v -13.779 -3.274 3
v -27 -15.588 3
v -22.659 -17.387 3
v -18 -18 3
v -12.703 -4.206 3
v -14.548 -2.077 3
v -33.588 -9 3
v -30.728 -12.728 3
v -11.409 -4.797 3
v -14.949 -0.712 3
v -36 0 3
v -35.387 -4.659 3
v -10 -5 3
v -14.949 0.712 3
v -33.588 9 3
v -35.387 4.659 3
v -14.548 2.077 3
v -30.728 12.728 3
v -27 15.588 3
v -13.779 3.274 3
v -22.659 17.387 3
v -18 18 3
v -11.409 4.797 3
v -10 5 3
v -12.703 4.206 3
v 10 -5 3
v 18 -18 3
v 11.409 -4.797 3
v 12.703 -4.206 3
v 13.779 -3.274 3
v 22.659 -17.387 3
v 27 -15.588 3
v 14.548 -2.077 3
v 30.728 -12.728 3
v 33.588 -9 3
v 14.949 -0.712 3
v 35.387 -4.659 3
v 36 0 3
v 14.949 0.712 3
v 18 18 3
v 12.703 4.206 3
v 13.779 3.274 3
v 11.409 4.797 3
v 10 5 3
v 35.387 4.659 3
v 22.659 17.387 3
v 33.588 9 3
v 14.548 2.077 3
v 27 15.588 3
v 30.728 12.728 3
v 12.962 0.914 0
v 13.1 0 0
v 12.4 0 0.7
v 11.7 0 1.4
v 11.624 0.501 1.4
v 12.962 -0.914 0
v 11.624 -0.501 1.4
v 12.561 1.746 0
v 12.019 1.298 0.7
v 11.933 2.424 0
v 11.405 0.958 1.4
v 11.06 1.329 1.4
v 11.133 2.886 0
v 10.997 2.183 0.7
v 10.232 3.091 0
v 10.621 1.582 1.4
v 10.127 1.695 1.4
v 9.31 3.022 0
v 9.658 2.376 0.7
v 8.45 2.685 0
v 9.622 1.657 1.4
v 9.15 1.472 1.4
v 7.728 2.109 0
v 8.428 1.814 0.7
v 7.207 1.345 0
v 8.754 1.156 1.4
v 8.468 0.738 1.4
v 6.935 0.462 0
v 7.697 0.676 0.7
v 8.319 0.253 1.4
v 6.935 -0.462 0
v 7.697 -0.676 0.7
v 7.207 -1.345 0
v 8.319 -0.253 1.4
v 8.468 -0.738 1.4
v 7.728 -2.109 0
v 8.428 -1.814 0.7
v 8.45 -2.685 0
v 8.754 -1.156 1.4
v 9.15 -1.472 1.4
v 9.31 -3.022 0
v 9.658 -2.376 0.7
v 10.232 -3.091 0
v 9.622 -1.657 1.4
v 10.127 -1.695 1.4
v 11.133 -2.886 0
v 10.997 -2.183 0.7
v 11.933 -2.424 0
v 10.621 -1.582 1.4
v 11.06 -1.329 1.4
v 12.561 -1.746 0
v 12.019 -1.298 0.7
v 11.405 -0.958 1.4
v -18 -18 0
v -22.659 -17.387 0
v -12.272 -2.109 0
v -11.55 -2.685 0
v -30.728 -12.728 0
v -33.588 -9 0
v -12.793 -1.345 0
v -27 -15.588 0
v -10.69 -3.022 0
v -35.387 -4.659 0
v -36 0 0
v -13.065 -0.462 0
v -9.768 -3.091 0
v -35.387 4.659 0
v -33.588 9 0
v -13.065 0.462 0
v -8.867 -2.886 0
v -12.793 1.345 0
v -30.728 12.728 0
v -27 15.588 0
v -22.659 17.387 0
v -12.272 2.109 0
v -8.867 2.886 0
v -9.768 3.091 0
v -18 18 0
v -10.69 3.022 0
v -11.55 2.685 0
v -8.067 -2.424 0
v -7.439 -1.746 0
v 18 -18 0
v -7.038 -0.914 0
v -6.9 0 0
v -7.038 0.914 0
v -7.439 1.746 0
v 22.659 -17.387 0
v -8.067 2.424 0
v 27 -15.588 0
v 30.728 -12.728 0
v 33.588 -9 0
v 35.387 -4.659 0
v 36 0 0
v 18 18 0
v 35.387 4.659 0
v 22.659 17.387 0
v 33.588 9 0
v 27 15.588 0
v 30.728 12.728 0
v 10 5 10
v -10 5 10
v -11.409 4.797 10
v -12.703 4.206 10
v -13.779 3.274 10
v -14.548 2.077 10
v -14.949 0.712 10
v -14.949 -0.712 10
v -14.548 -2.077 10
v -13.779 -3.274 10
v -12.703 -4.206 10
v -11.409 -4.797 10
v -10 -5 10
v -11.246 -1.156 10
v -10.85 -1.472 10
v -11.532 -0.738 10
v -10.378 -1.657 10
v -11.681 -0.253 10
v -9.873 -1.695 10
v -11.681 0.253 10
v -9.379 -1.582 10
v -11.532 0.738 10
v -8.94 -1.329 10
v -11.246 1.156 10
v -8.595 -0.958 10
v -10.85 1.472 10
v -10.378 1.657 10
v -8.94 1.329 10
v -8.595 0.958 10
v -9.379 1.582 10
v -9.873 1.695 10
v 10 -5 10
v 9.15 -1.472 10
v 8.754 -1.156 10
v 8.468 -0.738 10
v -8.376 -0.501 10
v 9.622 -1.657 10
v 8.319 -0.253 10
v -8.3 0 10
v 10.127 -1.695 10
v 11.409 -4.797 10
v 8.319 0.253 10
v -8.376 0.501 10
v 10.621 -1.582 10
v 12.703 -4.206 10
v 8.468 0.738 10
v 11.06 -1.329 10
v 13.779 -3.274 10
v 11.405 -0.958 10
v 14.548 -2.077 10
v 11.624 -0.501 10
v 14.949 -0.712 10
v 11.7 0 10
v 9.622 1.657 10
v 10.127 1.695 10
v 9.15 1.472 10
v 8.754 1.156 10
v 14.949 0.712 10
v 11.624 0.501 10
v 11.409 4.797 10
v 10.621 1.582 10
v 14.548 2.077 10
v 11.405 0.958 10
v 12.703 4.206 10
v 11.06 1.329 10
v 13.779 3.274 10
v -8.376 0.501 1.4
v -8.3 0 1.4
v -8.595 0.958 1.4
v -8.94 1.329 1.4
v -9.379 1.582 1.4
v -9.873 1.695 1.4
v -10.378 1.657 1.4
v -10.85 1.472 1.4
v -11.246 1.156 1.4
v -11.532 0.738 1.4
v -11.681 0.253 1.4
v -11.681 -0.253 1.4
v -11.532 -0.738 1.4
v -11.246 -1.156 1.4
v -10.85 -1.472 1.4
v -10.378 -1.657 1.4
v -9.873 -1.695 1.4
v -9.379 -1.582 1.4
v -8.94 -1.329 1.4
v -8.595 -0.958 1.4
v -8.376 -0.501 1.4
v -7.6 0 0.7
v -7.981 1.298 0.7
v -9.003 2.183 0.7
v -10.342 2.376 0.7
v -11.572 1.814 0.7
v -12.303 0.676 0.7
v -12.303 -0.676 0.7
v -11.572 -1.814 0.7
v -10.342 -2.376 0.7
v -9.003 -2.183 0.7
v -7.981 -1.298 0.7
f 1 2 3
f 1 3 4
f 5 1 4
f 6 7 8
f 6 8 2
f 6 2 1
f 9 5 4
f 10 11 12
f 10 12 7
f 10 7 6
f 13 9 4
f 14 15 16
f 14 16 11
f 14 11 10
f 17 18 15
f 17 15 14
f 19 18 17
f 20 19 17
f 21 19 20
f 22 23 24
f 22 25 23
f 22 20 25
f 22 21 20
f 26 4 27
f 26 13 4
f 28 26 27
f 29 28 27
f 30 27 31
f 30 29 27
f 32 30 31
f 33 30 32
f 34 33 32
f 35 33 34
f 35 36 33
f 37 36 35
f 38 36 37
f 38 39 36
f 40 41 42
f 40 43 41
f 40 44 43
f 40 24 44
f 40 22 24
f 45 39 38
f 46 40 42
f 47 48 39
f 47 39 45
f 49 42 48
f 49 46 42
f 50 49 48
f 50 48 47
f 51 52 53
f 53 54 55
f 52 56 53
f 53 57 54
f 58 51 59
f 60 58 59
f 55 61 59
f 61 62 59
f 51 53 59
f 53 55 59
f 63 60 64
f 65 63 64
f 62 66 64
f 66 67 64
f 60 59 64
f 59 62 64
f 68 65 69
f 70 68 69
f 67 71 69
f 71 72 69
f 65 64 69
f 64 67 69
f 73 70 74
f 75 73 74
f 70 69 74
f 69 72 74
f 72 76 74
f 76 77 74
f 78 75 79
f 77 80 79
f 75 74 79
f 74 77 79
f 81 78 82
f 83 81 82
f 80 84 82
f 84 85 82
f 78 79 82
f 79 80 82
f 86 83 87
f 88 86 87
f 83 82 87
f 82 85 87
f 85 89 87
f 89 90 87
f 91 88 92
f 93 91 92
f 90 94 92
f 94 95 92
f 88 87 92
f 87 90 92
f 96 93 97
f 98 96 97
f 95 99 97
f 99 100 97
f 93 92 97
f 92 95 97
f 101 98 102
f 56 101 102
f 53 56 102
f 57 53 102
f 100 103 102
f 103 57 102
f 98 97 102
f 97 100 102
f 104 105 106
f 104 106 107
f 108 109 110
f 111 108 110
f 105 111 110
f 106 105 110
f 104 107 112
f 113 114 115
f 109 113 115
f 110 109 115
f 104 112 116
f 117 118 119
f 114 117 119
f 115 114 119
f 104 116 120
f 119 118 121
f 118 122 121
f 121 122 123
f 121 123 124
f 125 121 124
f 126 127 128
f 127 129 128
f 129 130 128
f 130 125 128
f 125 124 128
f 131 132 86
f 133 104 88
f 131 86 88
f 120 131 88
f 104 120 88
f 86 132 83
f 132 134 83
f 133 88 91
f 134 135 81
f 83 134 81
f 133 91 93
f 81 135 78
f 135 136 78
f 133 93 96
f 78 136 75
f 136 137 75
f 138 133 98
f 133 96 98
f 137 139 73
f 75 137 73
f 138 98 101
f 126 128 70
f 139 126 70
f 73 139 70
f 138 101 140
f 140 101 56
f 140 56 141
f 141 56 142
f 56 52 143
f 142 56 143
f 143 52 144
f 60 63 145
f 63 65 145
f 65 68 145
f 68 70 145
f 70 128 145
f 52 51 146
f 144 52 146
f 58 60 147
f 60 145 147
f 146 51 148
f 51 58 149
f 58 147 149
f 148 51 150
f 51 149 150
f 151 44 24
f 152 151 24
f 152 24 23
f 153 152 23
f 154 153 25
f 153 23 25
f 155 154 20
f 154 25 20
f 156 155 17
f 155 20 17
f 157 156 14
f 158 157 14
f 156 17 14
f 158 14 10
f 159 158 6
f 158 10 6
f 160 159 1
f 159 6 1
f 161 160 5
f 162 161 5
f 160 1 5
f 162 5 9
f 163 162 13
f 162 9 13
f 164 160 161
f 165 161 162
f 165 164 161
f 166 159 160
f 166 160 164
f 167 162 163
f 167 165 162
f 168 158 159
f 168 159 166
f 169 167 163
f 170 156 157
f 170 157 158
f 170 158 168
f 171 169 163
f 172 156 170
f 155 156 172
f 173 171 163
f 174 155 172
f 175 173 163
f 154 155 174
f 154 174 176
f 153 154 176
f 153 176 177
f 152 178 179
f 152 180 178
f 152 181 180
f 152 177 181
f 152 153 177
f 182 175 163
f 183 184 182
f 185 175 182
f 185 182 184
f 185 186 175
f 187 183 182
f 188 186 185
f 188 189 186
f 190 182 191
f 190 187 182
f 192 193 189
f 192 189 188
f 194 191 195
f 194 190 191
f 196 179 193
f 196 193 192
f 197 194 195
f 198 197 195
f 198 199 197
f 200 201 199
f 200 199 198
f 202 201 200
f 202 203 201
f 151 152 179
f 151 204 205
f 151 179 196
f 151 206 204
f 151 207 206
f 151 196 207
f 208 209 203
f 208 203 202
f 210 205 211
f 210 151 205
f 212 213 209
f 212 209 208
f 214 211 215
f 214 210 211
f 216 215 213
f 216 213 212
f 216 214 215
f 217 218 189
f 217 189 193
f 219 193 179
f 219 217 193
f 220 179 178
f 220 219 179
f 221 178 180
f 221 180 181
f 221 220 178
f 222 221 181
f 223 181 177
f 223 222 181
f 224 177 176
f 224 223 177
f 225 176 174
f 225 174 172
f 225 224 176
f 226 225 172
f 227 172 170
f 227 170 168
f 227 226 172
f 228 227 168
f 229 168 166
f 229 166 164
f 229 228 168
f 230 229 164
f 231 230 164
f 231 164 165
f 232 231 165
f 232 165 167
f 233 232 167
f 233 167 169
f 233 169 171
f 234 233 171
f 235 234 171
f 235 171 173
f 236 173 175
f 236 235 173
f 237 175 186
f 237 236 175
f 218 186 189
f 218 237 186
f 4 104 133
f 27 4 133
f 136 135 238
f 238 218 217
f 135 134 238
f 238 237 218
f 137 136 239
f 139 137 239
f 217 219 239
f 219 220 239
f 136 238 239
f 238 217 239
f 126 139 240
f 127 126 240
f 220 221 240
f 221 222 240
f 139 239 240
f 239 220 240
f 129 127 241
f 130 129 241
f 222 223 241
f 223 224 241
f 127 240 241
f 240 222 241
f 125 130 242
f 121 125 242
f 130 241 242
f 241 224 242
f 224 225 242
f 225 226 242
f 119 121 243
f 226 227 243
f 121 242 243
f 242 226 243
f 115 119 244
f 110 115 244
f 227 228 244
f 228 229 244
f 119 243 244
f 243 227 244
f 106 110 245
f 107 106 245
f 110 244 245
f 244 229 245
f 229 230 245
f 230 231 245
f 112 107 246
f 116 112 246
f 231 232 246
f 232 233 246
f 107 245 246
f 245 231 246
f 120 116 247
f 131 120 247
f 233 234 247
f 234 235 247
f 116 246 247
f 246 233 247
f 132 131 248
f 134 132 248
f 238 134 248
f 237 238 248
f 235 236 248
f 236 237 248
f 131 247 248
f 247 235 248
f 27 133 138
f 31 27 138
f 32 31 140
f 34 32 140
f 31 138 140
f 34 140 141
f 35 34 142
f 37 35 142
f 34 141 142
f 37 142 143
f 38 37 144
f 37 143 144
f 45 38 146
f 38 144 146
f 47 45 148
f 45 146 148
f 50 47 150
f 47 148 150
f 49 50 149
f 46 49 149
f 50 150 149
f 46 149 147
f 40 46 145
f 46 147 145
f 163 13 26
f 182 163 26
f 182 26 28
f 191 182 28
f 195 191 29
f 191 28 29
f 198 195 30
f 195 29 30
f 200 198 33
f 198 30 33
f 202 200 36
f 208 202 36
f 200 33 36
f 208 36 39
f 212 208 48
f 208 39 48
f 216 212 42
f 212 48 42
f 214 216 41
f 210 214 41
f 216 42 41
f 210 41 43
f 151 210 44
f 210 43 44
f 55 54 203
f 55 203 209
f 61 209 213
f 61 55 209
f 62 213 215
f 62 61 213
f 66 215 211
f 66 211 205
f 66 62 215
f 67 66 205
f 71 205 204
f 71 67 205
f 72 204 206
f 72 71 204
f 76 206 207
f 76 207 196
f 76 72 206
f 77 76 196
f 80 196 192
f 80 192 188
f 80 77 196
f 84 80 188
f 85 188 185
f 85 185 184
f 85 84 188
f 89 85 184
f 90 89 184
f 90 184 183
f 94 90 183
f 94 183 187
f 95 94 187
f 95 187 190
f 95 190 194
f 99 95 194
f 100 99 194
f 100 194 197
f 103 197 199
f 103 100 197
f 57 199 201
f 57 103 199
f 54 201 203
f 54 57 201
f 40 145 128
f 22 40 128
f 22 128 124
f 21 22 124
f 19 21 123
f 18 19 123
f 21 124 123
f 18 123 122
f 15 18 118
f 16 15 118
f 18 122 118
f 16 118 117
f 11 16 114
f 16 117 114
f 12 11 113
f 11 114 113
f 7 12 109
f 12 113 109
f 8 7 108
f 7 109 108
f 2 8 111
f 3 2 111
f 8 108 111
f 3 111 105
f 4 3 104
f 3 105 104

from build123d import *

# Parameters (mm, degrees)
EXTRUDE_1_DEPTH = 3
SKETCH_1_3_R    = 1.7
EXTRUDE_2_DEPTH = 10
CHAMFER_1_SIZE  = 1.4


with BuildPart() as part:
    # 草图1 → 凸台-拉伸1 (new body)
    with BuildSketch(Plane.XY):
        with BuildLine():
            Line((18, 18), (-18, 18))
            ThreePointArc((-18, 18), (-36, 0), (-18, -18))
            Line((-18, -18), (18, -18))
            ThreePointArc((18, -18), (36, 0), (18, 18))
        make_face()
        with BuildLine():
            ThreePointArc((-10, -5), (-15, 0), (-10, 5))
            Line((-10, 5), (10, 5))
            ThreePointArc((10, 5), (15, 0), (10, -5))
            Line((10, -5), (-10, -5))
        make_face(mode=Mode.SUBTRACT)
    extrude(amount=EXTRUDE_1_DEPTH)

    # 草图1<3> → 凸台-拉伸2 (add)
    with BuildSketch(Plane.XY):
        with BuildLine():
            Line((10, 5), (-10, 5))
            ThreePointArc((-10, 5), (-15, 0), (-10, -5))
            Line((-10, -5), (10, -5))
            ThreePointArc((10, -5), (15, 0), (10, 5))
        make_face()
        with Locations((-10, 0)):
            Circle(SKETCH_1_3_R, mode=Mode.SUBTRACT)
        with Locations((10, 0)):
            Circle(SKETCH_1_3_R, mode=Mode.SUBTRACT)
    extrude(amount=EXTRUDE_2_DEPTH)

    # 倒角1
    chamfer_1_edges = [part.edges().sort_by_distance(p)[0] for p in [
        (8.3, 0, 0),
        (-11.7, 0, 0),
    ]]
    chamfer(chamfer_1_edges, length=CHAMFER_1_SIZE)


solid = part.part
